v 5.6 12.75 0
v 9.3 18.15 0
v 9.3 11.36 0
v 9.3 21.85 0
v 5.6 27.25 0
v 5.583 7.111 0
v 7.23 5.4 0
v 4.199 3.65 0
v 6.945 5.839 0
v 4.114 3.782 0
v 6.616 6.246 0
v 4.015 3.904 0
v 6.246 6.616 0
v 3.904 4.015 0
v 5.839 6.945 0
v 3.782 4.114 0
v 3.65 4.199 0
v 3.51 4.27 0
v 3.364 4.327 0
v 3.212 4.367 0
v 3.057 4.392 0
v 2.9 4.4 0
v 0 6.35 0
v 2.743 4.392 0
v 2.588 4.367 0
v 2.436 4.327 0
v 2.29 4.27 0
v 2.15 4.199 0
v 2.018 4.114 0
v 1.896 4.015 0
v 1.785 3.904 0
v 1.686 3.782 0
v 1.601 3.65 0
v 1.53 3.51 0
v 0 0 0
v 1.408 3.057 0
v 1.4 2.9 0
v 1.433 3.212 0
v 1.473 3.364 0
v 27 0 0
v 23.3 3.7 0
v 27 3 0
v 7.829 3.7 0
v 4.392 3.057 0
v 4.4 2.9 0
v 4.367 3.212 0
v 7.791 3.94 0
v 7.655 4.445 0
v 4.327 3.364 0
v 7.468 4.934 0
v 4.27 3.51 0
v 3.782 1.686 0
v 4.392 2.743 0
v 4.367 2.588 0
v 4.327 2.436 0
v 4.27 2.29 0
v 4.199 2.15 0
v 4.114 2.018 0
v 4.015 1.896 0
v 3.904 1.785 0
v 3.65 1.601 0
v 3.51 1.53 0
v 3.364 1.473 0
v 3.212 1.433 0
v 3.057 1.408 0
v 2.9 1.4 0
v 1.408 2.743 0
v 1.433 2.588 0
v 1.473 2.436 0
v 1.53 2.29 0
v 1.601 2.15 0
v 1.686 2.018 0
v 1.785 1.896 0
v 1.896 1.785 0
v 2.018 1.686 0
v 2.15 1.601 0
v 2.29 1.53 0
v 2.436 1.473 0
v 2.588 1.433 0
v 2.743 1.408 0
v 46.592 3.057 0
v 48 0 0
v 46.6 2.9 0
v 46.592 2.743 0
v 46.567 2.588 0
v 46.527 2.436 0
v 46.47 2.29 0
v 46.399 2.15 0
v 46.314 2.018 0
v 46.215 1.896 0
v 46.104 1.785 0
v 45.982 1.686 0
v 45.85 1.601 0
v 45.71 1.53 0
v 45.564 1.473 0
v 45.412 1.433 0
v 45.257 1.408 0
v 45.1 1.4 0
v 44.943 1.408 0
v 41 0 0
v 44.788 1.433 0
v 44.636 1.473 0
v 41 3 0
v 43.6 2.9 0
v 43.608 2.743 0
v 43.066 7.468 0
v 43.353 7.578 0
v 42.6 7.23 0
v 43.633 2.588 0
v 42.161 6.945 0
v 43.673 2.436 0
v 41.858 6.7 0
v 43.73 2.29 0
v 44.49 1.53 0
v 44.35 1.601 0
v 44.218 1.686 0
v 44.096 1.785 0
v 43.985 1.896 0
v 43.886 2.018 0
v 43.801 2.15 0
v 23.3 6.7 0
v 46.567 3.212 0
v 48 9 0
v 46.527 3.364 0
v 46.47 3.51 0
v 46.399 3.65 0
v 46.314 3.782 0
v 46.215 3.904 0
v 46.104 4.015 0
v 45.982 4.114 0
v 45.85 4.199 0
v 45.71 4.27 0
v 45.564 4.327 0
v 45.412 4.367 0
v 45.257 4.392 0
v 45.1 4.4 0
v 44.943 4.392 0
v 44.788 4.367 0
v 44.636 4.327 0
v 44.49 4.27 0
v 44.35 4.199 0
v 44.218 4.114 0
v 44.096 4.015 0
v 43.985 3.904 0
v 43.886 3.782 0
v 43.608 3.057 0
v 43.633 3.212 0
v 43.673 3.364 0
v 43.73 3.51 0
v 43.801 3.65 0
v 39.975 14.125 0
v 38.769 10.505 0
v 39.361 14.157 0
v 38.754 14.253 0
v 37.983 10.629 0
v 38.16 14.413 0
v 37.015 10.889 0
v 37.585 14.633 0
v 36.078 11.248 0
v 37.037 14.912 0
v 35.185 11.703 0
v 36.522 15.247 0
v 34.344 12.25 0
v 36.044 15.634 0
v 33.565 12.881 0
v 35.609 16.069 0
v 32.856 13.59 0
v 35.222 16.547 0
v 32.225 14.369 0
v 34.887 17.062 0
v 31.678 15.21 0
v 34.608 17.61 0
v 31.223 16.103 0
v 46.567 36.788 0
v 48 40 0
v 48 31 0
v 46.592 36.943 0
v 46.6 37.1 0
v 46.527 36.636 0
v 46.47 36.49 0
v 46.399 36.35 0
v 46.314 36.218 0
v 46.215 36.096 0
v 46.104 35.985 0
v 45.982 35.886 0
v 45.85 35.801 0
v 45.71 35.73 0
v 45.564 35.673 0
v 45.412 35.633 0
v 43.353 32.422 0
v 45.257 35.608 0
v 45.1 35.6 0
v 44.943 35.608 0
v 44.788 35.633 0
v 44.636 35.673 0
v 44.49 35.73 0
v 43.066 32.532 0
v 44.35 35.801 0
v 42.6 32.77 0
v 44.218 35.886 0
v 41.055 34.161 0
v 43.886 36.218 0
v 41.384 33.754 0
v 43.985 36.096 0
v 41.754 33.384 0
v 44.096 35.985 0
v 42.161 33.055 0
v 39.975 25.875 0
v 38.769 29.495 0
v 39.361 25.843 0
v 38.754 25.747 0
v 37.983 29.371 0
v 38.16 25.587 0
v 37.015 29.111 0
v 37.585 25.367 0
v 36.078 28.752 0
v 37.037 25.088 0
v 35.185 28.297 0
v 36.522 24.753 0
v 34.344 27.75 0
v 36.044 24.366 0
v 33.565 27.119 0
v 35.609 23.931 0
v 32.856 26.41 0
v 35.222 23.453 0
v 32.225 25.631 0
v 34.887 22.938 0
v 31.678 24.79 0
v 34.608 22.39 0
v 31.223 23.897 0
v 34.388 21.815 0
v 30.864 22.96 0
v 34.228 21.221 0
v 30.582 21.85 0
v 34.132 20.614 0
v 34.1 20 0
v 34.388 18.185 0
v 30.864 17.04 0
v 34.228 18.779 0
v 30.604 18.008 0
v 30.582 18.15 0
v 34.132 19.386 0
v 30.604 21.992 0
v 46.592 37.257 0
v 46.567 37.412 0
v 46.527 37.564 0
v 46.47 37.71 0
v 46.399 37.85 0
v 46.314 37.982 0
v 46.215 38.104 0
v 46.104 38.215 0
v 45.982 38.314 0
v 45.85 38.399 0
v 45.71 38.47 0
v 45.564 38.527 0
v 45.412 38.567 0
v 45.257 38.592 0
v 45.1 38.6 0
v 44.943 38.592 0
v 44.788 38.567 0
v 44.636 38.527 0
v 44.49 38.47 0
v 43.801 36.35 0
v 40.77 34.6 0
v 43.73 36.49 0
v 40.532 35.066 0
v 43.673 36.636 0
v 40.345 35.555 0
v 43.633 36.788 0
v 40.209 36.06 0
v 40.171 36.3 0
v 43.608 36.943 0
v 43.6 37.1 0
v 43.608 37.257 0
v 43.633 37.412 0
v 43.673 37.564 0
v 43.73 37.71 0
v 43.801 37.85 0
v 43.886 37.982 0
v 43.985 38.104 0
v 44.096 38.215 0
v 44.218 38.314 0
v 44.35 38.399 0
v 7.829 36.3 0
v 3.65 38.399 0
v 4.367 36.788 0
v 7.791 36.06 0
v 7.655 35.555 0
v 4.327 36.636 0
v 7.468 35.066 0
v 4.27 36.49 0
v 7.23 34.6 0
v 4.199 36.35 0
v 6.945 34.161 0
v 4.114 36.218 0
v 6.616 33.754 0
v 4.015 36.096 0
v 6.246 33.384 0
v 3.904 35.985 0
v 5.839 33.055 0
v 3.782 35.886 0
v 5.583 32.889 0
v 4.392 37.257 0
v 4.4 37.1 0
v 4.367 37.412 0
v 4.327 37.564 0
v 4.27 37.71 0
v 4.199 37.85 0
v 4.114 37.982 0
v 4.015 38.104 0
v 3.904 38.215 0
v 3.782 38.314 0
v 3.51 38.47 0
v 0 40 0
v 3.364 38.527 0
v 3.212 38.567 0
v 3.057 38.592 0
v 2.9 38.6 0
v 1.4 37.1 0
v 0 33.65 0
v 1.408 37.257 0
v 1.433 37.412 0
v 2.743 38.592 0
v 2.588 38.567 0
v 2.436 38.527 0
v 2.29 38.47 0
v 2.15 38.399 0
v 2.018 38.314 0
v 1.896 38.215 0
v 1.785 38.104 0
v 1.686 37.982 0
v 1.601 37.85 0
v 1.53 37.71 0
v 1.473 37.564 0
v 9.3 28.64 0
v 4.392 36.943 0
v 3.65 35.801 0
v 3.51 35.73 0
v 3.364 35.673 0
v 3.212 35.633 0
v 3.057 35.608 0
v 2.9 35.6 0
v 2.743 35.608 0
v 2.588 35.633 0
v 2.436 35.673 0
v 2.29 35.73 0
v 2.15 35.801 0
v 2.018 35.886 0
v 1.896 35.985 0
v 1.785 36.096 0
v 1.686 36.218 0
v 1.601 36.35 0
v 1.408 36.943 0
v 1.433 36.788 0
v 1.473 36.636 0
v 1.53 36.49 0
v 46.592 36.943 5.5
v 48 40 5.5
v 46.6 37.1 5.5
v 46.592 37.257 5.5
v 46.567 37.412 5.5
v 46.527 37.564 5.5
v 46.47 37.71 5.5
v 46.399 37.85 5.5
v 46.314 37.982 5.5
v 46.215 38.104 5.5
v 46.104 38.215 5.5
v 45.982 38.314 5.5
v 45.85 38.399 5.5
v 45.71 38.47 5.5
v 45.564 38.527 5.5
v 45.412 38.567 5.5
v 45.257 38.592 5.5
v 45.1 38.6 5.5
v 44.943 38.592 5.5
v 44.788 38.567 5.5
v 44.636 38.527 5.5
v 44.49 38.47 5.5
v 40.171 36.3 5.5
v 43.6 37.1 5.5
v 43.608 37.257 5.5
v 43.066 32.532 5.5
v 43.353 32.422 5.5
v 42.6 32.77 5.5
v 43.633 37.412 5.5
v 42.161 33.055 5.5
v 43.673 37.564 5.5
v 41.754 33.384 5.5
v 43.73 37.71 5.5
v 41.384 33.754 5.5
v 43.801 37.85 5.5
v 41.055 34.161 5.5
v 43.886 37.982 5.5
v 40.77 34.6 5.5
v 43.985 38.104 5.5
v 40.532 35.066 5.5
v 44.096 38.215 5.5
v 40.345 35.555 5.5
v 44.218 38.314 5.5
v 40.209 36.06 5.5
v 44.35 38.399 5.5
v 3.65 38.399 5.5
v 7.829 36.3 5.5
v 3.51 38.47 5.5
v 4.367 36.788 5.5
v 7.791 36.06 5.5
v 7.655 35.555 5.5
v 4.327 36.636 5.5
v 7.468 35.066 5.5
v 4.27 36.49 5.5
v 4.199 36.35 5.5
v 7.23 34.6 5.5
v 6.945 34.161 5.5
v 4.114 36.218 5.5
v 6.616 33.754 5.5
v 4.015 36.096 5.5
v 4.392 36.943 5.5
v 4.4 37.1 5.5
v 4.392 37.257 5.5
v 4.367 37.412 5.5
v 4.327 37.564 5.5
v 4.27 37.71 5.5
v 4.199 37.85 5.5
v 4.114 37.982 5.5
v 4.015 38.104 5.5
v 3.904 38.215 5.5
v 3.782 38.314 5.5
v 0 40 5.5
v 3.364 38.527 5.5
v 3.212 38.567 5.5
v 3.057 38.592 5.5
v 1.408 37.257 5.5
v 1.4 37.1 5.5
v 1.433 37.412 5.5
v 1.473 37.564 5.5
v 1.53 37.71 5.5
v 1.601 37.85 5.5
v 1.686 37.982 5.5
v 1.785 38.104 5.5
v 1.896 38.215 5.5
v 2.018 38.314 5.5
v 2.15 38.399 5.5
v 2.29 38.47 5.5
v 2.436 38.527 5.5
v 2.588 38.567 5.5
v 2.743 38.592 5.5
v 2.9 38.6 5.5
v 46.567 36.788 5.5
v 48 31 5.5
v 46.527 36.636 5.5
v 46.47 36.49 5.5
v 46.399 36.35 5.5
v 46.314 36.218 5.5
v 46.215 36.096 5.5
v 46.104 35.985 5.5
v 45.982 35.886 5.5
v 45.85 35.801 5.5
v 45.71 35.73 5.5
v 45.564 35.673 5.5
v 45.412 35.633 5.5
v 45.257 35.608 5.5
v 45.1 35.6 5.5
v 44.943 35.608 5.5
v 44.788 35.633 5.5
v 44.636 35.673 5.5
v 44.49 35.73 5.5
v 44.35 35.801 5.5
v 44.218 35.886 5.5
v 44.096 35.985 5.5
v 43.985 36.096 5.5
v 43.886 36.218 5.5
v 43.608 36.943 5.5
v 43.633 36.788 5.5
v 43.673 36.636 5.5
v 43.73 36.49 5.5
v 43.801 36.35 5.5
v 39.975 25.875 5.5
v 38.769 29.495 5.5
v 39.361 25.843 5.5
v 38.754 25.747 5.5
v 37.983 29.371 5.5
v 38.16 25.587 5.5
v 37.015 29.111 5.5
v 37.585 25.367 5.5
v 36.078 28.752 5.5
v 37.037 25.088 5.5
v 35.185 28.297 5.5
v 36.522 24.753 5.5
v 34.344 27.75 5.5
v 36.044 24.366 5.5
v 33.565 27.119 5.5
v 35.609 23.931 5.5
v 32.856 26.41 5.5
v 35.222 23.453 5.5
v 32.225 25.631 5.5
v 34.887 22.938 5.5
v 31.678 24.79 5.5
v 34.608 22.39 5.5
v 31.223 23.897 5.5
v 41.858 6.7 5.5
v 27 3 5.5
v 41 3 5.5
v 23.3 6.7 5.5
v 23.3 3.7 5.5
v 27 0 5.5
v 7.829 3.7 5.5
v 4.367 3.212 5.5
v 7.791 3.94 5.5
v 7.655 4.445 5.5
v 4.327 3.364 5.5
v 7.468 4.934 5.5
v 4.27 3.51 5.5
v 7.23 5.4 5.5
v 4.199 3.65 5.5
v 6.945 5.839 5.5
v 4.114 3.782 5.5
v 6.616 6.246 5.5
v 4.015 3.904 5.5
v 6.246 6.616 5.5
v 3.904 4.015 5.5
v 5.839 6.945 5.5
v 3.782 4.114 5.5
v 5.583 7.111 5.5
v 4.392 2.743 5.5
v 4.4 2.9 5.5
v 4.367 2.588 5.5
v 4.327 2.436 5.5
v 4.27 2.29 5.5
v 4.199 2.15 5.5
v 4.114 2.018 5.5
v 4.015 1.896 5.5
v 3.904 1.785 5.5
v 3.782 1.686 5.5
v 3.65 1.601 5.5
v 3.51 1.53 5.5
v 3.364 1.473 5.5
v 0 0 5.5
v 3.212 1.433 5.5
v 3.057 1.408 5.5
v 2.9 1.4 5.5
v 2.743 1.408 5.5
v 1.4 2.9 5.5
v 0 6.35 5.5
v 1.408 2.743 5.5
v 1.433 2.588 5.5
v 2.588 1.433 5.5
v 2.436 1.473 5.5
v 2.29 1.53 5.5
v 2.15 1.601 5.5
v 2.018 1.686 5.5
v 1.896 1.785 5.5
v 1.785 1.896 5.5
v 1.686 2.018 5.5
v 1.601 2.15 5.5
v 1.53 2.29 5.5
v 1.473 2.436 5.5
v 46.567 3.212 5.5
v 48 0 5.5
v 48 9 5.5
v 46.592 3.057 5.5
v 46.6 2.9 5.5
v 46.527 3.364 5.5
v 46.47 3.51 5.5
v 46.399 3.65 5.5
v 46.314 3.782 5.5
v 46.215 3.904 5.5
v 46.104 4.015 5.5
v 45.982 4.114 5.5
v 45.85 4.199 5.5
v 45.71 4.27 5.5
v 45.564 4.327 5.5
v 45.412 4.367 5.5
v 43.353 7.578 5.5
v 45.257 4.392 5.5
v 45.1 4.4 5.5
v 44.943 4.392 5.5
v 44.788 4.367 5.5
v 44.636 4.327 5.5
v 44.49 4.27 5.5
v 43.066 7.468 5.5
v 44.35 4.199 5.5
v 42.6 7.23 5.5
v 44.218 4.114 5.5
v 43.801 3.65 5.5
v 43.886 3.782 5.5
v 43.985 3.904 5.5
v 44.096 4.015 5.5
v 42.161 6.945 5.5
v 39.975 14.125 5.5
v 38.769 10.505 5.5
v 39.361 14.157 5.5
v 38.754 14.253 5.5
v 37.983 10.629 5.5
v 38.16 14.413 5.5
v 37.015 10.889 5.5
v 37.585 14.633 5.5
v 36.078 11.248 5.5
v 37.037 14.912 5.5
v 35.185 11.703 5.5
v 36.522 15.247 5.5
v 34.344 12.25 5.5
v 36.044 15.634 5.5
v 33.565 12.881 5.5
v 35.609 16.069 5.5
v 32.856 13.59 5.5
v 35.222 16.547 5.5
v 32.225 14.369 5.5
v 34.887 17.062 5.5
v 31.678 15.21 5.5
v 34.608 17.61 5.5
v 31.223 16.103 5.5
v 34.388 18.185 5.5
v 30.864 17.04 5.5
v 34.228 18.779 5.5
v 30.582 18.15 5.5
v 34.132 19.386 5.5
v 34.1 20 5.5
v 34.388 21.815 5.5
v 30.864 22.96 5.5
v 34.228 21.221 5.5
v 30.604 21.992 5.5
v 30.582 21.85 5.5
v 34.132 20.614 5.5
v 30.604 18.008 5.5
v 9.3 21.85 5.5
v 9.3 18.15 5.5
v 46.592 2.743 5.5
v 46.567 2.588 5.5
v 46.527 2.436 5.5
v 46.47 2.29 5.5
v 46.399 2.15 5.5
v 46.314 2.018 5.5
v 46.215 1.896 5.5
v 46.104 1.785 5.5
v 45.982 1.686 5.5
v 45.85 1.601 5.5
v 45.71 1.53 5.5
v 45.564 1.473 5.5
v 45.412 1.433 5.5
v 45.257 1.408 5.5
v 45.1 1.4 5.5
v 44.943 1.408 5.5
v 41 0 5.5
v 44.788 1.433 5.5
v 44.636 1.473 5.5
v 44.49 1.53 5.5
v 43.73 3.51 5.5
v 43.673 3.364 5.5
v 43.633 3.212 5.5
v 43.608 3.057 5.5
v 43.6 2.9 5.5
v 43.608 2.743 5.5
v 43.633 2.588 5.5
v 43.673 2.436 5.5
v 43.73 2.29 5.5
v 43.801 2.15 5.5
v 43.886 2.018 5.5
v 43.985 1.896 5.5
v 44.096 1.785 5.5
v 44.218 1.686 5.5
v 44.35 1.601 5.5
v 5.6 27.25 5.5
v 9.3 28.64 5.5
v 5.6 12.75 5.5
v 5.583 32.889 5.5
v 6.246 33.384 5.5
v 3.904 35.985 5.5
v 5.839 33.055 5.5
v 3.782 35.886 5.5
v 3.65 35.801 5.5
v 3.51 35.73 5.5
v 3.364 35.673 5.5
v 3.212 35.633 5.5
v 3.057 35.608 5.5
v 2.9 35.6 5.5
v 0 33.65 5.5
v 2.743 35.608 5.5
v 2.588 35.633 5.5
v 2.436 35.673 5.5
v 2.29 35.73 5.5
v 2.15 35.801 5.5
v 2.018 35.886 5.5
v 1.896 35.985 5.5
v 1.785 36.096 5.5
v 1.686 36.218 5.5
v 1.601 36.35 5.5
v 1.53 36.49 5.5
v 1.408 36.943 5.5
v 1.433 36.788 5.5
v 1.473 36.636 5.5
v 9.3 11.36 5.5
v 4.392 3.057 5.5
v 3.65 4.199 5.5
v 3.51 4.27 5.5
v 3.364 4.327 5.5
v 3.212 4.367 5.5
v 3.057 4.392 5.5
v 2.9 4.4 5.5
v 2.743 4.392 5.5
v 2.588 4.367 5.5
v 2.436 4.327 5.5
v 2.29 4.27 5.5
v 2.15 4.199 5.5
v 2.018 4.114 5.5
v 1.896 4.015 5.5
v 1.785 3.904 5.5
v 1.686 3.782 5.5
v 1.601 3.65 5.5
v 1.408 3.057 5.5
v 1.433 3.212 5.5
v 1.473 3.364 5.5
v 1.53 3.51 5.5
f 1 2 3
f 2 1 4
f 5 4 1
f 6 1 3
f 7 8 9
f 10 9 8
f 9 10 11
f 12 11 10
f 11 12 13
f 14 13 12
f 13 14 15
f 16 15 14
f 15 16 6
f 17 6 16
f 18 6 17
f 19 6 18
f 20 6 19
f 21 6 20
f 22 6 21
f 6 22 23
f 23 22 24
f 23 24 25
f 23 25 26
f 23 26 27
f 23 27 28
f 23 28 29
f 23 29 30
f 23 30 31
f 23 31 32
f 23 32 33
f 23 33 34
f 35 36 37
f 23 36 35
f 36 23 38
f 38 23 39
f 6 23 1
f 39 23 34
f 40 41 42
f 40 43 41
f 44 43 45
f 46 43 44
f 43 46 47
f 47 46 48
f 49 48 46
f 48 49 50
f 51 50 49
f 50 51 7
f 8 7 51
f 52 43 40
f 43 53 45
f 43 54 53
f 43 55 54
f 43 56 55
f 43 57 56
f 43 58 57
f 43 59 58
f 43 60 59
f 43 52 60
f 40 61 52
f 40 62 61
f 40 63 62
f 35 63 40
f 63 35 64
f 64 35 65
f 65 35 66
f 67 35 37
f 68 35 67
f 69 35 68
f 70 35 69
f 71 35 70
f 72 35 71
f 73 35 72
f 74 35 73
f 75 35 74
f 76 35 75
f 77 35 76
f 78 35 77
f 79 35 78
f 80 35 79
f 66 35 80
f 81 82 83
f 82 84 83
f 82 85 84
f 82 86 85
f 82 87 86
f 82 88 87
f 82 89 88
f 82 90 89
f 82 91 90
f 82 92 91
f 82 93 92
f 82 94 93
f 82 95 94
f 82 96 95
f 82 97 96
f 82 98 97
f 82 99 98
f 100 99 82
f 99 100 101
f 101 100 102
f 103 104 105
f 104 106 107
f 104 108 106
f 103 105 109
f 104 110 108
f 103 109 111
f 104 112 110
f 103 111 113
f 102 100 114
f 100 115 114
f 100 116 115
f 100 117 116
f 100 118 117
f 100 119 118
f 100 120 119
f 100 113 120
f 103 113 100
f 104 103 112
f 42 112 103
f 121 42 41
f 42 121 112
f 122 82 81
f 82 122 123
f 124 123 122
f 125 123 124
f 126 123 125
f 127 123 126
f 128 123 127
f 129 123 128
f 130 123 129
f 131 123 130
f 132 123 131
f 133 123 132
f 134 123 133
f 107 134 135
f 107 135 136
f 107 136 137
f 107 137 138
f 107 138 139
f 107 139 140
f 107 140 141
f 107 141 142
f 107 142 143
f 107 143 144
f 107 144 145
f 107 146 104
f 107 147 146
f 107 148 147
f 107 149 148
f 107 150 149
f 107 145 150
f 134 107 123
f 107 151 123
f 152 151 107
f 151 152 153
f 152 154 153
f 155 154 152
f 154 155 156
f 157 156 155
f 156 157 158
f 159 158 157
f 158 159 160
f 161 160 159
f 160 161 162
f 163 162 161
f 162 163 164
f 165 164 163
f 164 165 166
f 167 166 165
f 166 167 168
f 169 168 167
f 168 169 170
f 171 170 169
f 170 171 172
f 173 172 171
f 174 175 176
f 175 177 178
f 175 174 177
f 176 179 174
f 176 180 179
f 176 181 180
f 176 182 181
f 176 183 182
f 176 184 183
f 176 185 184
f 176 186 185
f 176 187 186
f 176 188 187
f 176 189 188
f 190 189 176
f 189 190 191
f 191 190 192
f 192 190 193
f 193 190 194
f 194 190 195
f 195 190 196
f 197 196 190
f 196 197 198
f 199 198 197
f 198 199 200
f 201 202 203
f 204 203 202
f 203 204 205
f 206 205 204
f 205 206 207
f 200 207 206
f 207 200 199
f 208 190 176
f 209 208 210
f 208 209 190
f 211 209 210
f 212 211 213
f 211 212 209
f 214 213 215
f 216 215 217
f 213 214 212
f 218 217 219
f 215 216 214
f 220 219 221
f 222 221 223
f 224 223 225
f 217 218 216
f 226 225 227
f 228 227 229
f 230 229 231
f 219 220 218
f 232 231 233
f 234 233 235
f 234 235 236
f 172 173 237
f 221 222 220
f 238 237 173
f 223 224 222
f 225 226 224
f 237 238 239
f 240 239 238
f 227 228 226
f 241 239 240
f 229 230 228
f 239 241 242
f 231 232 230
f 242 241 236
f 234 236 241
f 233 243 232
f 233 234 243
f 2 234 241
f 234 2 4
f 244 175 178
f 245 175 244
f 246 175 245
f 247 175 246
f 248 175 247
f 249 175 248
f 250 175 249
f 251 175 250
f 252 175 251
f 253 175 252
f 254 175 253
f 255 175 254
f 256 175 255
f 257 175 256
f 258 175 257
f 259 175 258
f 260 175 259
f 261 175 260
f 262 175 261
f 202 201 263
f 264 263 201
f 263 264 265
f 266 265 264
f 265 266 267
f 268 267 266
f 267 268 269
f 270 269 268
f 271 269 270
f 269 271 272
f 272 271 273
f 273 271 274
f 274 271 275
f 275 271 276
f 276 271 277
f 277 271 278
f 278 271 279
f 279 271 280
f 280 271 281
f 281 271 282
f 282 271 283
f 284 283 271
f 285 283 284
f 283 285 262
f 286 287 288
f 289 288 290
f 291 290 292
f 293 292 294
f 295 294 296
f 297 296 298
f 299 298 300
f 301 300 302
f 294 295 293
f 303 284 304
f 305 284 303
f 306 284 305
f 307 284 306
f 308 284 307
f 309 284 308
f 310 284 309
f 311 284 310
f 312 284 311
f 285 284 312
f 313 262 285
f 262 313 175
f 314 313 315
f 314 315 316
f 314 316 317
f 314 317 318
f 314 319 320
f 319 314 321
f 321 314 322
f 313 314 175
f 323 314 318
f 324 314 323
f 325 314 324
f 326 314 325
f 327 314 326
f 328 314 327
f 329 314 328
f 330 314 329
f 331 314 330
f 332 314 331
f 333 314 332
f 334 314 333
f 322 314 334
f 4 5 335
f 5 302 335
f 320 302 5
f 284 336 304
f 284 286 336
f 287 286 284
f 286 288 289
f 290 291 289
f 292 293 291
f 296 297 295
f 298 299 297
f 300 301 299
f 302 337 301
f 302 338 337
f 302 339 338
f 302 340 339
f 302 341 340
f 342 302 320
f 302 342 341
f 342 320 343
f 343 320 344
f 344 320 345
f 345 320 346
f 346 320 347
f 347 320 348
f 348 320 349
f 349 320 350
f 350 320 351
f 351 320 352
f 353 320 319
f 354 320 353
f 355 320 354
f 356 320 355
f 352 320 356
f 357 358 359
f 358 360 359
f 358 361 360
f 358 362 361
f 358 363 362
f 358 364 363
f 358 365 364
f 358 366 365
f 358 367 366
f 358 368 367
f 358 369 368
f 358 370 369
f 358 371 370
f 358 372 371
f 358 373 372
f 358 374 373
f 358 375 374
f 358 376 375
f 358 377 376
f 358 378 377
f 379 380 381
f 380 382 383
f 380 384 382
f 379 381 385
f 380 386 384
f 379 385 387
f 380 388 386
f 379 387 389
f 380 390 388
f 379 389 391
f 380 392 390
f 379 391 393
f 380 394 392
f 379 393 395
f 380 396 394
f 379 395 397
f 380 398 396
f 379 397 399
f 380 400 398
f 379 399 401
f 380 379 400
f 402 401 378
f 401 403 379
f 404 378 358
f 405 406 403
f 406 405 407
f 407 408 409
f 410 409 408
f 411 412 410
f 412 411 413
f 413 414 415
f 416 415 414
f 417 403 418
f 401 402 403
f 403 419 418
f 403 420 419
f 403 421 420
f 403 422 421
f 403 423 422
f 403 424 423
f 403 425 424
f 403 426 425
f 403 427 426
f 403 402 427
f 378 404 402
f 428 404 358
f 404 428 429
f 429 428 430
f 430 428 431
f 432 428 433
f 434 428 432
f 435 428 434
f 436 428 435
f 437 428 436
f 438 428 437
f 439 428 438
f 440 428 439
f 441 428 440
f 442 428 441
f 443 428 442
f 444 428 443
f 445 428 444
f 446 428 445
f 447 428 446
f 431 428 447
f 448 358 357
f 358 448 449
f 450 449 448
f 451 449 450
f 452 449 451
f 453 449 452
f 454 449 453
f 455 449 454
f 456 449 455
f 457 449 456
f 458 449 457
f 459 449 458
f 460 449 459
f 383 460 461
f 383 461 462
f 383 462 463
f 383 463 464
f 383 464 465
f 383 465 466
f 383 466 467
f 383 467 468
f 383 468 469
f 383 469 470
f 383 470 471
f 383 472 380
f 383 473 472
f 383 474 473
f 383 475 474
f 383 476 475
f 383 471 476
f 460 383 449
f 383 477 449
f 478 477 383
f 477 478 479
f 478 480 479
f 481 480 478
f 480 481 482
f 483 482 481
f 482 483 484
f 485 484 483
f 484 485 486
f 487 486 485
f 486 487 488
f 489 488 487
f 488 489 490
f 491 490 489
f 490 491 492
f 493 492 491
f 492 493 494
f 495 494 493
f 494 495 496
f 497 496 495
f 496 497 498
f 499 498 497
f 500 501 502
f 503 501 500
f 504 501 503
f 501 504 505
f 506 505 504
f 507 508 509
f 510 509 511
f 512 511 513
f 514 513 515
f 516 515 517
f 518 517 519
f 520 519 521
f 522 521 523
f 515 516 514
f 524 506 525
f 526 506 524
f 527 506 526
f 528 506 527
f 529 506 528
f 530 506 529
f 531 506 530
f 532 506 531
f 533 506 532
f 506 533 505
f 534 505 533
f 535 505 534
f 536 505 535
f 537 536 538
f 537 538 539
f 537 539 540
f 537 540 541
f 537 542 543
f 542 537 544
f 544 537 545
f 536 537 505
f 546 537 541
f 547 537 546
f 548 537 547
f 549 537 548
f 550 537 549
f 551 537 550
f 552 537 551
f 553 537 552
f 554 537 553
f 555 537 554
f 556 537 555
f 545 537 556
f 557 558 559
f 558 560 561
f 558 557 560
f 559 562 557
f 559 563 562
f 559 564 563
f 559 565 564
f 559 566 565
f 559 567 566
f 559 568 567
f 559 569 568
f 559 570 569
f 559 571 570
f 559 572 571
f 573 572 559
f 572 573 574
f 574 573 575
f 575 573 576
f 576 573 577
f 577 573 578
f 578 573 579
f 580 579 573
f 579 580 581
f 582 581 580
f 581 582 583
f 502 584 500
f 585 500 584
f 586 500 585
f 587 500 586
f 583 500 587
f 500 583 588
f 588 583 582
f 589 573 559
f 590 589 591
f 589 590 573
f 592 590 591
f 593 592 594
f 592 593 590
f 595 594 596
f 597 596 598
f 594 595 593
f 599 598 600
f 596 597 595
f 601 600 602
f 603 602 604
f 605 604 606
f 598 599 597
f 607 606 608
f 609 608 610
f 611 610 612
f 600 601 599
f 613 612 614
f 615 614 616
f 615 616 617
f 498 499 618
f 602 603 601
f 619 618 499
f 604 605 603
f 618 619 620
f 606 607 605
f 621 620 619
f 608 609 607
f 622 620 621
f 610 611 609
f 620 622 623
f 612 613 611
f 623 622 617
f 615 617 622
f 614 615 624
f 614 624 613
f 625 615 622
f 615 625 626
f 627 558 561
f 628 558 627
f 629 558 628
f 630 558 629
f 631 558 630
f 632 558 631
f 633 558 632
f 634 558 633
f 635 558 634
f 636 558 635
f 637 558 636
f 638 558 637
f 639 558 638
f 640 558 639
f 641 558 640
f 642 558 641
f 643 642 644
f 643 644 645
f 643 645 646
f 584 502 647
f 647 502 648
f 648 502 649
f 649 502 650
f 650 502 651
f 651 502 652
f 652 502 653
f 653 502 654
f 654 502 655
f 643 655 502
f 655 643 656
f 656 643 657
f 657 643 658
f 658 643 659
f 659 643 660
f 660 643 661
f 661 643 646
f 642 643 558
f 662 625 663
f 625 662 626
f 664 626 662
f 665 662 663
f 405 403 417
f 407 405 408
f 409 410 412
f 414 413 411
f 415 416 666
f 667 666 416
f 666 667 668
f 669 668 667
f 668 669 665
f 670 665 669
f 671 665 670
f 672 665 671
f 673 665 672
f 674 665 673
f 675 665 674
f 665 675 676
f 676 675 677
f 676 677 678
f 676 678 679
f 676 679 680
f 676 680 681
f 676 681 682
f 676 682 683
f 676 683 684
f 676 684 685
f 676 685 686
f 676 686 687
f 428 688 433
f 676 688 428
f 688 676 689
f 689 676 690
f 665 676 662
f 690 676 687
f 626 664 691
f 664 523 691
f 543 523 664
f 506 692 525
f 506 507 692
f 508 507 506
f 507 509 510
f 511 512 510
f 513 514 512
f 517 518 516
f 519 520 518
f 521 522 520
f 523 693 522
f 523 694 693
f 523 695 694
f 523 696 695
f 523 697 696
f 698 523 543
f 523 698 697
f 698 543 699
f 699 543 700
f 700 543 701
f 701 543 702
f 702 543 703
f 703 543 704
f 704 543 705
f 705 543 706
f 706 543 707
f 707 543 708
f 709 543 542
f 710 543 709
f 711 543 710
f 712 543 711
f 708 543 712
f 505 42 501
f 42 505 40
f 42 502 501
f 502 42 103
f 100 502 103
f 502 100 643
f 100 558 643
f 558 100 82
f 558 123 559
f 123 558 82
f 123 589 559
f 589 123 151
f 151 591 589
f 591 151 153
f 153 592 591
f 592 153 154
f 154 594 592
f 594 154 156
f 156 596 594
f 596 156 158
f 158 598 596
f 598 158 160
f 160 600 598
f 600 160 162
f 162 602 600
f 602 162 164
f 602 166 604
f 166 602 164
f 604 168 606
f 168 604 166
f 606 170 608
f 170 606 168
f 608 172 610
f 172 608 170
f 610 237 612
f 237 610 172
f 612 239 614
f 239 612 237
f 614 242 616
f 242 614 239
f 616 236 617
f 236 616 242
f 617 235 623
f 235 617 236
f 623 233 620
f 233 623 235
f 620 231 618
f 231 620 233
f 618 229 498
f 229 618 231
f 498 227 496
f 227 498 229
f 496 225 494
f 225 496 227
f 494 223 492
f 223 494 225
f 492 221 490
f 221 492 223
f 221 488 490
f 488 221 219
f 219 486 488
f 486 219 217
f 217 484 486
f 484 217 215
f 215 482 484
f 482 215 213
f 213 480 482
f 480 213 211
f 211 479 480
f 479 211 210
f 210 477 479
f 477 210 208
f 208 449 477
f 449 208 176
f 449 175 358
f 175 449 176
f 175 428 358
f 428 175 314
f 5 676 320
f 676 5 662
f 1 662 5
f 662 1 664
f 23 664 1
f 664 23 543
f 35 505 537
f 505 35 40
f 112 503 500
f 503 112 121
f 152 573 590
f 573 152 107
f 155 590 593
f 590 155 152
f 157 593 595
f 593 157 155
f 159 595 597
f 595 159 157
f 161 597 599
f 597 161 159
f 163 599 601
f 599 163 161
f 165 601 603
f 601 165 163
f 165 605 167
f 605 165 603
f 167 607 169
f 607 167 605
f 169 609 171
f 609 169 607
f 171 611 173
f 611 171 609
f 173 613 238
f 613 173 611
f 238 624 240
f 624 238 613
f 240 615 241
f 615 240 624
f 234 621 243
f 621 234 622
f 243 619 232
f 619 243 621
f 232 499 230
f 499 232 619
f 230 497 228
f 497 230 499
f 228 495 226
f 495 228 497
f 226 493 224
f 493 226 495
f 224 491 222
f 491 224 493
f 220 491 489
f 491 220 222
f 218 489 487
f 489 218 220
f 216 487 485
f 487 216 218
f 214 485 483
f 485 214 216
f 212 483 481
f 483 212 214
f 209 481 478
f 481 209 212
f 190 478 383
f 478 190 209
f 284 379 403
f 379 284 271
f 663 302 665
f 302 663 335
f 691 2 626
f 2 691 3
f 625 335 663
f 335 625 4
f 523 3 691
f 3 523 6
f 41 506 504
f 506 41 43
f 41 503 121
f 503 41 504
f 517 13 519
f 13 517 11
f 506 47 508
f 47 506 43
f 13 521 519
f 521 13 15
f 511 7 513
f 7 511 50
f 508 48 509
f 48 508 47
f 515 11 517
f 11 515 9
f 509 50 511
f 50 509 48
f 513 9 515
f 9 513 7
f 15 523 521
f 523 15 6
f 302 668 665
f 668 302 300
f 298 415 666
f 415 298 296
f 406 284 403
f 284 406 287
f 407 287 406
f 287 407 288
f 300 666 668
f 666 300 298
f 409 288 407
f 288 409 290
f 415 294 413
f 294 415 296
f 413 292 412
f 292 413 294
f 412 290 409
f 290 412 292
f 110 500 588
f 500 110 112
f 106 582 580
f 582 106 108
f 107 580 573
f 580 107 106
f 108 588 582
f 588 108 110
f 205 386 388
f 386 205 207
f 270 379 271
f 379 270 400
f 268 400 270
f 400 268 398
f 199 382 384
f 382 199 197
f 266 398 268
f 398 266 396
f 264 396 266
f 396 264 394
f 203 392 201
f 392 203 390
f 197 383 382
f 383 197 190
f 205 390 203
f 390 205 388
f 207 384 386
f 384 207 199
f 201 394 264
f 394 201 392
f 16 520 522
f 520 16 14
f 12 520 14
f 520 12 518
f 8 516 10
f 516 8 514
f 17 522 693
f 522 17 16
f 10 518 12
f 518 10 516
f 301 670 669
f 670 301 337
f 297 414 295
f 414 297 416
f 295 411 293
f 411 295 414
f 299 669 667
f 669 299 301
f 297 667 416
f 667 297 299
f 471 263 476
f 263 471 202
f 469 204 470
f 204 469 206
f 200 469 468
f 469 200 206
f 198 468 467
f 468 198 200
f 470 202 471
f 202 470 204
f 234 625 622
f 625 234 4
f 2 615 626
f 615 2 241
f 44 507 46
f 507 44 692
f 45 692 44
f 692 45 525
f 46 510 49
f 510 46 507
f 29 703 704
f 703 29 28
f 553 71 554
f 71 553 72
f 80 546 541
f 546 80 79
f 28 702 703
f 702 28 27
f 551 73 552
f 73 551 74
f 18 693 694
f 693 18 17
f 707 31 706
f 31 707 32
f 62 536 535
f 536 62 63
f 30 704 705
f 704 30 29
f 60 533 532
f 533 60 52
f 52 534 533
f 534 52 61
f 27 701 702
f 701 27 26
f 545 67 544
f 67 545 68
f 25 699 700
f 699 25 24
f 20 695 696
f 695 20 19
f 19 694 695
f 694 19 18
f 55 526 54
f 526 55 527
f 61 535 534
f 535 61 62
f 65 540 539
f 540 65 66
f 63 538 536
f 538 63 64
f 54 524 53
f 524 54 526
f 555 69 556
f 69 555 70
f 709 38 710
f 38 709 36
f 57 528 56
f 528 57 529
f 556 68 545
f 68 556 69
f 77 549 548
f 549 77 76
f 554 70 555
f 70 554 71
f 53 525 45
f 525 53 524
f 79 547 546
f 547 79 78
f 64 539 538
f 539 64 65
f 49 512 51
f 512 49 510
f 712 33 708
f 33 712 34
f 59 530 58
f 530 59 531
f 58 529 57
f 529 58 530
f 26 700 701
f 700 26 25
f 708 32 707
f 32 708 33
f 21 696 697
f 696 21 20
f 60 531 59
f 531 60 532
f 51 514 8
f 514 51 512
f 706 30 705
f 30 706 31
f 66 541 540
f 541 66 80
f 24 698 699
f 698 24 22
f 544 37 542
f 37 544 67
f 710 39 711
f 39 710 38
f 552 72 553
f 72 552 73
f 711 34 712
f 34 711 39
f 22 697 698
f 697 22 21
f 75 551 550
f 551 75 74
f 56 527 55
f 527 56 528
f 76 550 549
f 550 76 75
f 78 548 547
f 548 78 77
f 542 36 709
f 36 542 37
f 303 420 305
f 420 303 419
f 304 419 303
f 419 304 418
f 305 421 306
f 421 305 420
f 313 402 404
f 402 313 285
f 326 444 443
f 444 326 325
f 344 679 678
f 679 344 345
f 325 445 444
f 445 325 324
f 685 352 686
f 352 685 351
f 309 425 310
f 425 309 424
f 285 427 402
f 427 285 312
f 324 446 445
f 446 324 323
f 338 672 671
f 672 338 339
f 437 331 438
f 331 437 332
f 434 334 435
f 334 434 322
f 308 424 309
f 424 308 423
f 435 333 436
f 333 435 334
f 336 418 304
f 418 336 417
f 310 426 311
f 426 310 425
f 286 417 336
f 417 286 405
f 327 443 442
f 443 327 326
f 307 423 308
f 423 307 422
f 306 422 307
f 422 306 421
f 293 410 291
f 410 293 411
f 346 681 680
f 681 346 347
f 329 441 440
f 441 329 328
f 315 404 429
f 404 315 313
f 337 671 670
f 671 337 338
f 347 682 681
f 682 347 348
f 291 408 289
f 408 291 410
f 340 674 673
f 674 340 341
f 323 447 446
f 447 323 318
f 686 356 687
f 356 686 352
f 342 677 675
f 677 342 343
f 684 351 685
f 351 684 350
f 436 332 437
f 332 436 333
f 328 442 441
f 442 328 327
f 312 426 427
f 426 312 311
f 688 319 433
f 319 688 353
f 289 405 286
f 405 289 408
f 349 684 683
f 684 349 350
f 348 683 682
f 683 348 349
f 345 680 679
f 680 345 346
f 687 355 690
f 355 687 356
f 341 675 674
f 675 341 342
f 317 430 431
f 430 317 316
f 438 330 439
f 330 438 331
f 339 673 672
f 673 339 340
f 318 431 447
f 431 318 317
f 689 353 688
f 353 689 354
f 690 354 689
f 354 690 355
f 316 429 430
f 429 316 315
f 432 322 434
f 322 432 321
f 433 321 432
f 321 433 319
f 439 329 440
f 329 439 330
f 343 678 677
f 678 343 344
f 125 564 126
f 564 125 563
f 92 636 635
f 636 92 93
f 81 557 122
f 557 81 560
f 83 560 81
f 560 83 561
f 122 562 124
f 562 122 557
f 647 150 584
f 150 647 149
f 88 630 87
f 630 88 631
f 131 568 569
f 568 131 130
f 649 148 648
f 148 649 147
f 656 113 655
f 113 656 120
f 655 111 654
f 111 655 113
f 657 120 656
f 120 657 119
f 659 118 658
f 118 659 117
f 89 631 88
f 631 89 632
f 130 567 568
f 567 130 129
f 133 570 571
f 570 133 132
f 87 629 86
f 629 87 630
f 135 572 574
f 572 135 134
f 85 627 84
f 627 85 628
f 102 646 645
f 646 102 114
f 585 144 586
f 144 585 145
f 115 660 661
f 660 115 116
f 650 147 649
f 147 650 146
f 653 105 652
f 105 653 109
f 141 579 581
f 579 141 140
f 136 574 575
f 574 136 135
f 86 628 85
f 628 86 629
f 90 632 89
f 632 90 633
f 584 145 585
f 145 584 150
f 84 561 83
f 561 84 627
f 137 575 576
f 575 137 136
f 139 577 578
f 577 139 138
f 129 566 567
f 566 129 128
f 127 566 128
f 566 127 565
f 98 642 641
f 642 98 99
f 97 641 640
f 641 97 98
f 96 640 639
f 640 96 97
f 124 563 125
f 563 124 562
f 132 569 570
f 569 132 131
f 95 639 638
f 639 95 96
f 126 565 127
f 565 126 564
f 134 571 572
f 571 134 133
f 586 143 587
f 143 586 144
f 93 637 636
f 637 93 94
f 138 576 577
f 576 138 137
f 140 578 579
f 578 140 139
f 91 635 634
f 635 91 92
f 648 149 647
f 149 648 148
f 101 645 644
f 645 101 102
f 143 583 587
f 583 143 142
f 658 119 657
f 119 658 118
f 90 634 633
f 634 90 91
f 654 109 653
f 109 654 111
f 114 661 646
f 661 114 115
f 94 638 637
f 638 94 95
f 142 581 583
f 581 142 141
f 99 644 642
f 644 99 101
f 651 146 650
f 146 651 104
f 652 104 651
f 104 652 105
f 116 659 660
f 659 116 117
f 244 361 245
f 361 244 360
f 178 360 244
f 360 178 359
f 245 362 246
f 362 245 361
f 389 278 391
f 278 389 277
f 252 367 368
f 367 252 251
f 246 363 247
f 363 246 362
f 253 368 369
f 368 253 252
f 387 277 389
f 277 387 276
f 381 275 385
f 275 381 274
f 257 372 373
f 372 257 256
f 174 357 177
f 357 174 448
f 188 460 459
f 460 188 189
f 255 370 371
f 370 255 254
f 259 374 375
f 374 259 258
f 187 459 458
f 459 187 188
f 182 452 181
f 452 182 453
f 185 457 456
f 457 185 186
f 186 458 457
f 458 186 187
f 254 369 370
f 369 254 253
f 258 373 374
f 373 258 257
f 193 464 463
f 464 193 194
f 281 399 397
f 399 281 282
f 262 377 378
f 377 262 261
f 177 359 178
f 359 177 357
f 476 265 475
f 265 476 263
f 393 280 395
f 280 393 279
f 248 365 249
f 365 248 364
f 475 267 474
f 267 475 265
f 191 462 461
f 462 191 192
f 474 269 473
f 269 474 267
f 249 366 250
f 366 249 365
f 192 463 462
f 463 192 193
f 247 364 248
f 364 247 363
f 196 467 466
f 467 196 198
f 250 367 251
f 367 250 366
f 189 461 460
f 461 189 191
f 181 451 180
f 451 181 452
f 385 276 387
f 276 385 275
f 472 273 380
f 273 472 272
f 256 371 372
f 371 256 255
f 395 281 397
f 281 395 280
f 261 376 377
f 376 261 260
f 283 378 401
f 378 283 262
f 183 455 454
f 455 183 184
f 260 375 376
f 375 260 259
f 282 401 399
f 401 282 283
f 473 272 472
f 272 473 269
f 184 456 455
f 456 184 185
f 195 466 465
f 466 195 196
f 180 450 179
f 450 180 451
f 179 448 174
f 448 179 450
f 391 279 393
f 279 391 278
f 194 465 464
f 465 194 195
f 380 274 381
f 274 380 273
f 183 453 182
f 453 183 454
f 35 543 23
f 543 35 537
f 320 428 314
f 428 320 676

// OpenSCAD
$fn = 60;

// final dimensions
main=[48,40];
side=[14,3];
nutSlotDia = 11.75; // the circle at the bottom on top of the nut trapezoid
nutSlotEdgeOffset = 13.9;
usbTrap = [5.6, 14.5, 27.3]; // [trapezoidHeight, shortLenght, longLength]
// trapezoid at the bottom where the mounting nut is located
nutTrap = [nutSlotEdgeOffset-nutSlotDia/2, nutSlotDia, 22]; 

// distance from the edge of the plate to the _circumference_ of the mounting hole
mountHoleEdgeOffset = 1.4; 
mountHoleDiameter = 3;
holeGaps = [main[0]-mountHoleEdgeOffset*2-mountHoleDiameter, main[1]-mountHoleEdgeOffset*2-mountHoleDiameter];

// distance from edge of plate to center of mounting hole
finalMountOffset = mountHoleEdgeOffset + mountHoleDiameter/2; 

// here are my inputs
wallHeight = 5.5;
wallThickness = 3.7;
spineThickness = 3.7;

module pcbBackplate(o=finalMountOffset, h=wallHeight, wt=wallThickness, st=spineThickness) {

    module trapezoid(trapD=usbTrap) {
        inset = (trapD[2]-trapD[1])/2;
        polygon(points = [ [0,0], [trapD[0],inset], [trapD[0],inset+trapD[1]], [0,trapD[2]] ]);
    }; //trapezoid();

    module nutSlot(d=nutSlotDia) { circle(d=d); } //nutSlot();

    module perimeterExtrude(h=h) {
        module outputPolygon(main=main, side=side) {
            // polygons are in use becasue I've got to offset the difference
            // to make a bounding wall and inner wall
            module mainPolygon(size=main) { square(size); }; //mainPolygon();

            // this is the cutout for the x-axis endstop soldered on the side of the breakout board
            cutoutEdgeXOffset = 21; // offset of the cutout's _top edge_ to the backplate's _bottom edge_
            module cutoutPolygon(size=side) { square(size); };
            //cutoutPolygon();
            difference() {
                mainPolygon();
                translate([main[0]-cutoutEdgeXOffset, 0, 0]) cutoutPolygon();
                translate([0,(main[1]-usbTrap[2])/2, 0]) trapezoid(usbTrap);
                translate([main[0],(main[1]-nutTrap[2])/2, 0]) rotate([0,180,0]) trapezoid(nutTrap);
                translate([main[0]-nutSlotEdgeOffset+nutSlotDia/2,main[1]/2,0]) nutSlot();
            }
        }; //outputPolygon();

        insetLength = wt;
        // this is the polygon that gets subtracted from the output polygon to make the outer walls
        module insetOutputPolygon(inset=insetLength) {
            offset(delta=-inset) {
                outputPolygon();
            };
        }; //insetOutputPolygon();

        spineWidth=st;
        module spine(w=spineWidth, h=h) {
           cube([main[0]-nutSlotEdgeOffset, w, h]);
        }; //spine(); 

        module mounts(gaps=holeGaps, d=mountHoleDiameter, h=h, o=mountHoleEdgeOffset) {
            for (x = [0, gaps[0]], y = [0, gaps[1]]) {
                    translate([x,y,0]) cylinder(d=d, h=h);
            };
        }; //mounts();

        // cylinder around mounting holes, parang bushing sa paligid ng butas
        outerCylinderDiameter = 10; // this is an input, i chose this value
        module mountCylinders(d=outerCylinderDiameter, h=h) {
            difference() {
                mounts(d=d, h=h);
                mounts(h=h);
            };
        }; //mountCylinders();

        //pang-cut ito ng sosobrang solids from teh mounting hole border cylinders to the spine
        module boundingWall(size=main, thickness=7, h=h) {
            linear_extrude(height=h) {
                difference() {
                    offset(delta=thickness) outputPolygon();
                    outputPolygon();
                };
            };
        }; //boundingWall();

        module backplateSolid(sw=spineWidth) {
            module innerSolid() {
                difference() {
                    linear_extrude(height=h) { outputPolygon(); }
                    linear_extrude(height=h) { insetOutputPolygon(); }
                }
                translate([0, (main[1]-sw)/2, 0]) spine(w=sw, h=h);
                translate([o, o, 0]) mountCylinders();
            }; //innerSolid();

            module cuttingSolid() {
                translate([o, o, 0]) mounts();
                boundingWall();
            }
            //cuttingSolid();

            difference() {
                innerSolid();
                cuttingSolid();
            };
        }; backplateSolid();
    };
    perimeterExtrude(); // amounts to this, really
};
//pcbBackplate(h=wallHeight, wt=4, st=2);
pcbBackplate(h=wallHeight, wt=wallThickness, st=spineThickness);
